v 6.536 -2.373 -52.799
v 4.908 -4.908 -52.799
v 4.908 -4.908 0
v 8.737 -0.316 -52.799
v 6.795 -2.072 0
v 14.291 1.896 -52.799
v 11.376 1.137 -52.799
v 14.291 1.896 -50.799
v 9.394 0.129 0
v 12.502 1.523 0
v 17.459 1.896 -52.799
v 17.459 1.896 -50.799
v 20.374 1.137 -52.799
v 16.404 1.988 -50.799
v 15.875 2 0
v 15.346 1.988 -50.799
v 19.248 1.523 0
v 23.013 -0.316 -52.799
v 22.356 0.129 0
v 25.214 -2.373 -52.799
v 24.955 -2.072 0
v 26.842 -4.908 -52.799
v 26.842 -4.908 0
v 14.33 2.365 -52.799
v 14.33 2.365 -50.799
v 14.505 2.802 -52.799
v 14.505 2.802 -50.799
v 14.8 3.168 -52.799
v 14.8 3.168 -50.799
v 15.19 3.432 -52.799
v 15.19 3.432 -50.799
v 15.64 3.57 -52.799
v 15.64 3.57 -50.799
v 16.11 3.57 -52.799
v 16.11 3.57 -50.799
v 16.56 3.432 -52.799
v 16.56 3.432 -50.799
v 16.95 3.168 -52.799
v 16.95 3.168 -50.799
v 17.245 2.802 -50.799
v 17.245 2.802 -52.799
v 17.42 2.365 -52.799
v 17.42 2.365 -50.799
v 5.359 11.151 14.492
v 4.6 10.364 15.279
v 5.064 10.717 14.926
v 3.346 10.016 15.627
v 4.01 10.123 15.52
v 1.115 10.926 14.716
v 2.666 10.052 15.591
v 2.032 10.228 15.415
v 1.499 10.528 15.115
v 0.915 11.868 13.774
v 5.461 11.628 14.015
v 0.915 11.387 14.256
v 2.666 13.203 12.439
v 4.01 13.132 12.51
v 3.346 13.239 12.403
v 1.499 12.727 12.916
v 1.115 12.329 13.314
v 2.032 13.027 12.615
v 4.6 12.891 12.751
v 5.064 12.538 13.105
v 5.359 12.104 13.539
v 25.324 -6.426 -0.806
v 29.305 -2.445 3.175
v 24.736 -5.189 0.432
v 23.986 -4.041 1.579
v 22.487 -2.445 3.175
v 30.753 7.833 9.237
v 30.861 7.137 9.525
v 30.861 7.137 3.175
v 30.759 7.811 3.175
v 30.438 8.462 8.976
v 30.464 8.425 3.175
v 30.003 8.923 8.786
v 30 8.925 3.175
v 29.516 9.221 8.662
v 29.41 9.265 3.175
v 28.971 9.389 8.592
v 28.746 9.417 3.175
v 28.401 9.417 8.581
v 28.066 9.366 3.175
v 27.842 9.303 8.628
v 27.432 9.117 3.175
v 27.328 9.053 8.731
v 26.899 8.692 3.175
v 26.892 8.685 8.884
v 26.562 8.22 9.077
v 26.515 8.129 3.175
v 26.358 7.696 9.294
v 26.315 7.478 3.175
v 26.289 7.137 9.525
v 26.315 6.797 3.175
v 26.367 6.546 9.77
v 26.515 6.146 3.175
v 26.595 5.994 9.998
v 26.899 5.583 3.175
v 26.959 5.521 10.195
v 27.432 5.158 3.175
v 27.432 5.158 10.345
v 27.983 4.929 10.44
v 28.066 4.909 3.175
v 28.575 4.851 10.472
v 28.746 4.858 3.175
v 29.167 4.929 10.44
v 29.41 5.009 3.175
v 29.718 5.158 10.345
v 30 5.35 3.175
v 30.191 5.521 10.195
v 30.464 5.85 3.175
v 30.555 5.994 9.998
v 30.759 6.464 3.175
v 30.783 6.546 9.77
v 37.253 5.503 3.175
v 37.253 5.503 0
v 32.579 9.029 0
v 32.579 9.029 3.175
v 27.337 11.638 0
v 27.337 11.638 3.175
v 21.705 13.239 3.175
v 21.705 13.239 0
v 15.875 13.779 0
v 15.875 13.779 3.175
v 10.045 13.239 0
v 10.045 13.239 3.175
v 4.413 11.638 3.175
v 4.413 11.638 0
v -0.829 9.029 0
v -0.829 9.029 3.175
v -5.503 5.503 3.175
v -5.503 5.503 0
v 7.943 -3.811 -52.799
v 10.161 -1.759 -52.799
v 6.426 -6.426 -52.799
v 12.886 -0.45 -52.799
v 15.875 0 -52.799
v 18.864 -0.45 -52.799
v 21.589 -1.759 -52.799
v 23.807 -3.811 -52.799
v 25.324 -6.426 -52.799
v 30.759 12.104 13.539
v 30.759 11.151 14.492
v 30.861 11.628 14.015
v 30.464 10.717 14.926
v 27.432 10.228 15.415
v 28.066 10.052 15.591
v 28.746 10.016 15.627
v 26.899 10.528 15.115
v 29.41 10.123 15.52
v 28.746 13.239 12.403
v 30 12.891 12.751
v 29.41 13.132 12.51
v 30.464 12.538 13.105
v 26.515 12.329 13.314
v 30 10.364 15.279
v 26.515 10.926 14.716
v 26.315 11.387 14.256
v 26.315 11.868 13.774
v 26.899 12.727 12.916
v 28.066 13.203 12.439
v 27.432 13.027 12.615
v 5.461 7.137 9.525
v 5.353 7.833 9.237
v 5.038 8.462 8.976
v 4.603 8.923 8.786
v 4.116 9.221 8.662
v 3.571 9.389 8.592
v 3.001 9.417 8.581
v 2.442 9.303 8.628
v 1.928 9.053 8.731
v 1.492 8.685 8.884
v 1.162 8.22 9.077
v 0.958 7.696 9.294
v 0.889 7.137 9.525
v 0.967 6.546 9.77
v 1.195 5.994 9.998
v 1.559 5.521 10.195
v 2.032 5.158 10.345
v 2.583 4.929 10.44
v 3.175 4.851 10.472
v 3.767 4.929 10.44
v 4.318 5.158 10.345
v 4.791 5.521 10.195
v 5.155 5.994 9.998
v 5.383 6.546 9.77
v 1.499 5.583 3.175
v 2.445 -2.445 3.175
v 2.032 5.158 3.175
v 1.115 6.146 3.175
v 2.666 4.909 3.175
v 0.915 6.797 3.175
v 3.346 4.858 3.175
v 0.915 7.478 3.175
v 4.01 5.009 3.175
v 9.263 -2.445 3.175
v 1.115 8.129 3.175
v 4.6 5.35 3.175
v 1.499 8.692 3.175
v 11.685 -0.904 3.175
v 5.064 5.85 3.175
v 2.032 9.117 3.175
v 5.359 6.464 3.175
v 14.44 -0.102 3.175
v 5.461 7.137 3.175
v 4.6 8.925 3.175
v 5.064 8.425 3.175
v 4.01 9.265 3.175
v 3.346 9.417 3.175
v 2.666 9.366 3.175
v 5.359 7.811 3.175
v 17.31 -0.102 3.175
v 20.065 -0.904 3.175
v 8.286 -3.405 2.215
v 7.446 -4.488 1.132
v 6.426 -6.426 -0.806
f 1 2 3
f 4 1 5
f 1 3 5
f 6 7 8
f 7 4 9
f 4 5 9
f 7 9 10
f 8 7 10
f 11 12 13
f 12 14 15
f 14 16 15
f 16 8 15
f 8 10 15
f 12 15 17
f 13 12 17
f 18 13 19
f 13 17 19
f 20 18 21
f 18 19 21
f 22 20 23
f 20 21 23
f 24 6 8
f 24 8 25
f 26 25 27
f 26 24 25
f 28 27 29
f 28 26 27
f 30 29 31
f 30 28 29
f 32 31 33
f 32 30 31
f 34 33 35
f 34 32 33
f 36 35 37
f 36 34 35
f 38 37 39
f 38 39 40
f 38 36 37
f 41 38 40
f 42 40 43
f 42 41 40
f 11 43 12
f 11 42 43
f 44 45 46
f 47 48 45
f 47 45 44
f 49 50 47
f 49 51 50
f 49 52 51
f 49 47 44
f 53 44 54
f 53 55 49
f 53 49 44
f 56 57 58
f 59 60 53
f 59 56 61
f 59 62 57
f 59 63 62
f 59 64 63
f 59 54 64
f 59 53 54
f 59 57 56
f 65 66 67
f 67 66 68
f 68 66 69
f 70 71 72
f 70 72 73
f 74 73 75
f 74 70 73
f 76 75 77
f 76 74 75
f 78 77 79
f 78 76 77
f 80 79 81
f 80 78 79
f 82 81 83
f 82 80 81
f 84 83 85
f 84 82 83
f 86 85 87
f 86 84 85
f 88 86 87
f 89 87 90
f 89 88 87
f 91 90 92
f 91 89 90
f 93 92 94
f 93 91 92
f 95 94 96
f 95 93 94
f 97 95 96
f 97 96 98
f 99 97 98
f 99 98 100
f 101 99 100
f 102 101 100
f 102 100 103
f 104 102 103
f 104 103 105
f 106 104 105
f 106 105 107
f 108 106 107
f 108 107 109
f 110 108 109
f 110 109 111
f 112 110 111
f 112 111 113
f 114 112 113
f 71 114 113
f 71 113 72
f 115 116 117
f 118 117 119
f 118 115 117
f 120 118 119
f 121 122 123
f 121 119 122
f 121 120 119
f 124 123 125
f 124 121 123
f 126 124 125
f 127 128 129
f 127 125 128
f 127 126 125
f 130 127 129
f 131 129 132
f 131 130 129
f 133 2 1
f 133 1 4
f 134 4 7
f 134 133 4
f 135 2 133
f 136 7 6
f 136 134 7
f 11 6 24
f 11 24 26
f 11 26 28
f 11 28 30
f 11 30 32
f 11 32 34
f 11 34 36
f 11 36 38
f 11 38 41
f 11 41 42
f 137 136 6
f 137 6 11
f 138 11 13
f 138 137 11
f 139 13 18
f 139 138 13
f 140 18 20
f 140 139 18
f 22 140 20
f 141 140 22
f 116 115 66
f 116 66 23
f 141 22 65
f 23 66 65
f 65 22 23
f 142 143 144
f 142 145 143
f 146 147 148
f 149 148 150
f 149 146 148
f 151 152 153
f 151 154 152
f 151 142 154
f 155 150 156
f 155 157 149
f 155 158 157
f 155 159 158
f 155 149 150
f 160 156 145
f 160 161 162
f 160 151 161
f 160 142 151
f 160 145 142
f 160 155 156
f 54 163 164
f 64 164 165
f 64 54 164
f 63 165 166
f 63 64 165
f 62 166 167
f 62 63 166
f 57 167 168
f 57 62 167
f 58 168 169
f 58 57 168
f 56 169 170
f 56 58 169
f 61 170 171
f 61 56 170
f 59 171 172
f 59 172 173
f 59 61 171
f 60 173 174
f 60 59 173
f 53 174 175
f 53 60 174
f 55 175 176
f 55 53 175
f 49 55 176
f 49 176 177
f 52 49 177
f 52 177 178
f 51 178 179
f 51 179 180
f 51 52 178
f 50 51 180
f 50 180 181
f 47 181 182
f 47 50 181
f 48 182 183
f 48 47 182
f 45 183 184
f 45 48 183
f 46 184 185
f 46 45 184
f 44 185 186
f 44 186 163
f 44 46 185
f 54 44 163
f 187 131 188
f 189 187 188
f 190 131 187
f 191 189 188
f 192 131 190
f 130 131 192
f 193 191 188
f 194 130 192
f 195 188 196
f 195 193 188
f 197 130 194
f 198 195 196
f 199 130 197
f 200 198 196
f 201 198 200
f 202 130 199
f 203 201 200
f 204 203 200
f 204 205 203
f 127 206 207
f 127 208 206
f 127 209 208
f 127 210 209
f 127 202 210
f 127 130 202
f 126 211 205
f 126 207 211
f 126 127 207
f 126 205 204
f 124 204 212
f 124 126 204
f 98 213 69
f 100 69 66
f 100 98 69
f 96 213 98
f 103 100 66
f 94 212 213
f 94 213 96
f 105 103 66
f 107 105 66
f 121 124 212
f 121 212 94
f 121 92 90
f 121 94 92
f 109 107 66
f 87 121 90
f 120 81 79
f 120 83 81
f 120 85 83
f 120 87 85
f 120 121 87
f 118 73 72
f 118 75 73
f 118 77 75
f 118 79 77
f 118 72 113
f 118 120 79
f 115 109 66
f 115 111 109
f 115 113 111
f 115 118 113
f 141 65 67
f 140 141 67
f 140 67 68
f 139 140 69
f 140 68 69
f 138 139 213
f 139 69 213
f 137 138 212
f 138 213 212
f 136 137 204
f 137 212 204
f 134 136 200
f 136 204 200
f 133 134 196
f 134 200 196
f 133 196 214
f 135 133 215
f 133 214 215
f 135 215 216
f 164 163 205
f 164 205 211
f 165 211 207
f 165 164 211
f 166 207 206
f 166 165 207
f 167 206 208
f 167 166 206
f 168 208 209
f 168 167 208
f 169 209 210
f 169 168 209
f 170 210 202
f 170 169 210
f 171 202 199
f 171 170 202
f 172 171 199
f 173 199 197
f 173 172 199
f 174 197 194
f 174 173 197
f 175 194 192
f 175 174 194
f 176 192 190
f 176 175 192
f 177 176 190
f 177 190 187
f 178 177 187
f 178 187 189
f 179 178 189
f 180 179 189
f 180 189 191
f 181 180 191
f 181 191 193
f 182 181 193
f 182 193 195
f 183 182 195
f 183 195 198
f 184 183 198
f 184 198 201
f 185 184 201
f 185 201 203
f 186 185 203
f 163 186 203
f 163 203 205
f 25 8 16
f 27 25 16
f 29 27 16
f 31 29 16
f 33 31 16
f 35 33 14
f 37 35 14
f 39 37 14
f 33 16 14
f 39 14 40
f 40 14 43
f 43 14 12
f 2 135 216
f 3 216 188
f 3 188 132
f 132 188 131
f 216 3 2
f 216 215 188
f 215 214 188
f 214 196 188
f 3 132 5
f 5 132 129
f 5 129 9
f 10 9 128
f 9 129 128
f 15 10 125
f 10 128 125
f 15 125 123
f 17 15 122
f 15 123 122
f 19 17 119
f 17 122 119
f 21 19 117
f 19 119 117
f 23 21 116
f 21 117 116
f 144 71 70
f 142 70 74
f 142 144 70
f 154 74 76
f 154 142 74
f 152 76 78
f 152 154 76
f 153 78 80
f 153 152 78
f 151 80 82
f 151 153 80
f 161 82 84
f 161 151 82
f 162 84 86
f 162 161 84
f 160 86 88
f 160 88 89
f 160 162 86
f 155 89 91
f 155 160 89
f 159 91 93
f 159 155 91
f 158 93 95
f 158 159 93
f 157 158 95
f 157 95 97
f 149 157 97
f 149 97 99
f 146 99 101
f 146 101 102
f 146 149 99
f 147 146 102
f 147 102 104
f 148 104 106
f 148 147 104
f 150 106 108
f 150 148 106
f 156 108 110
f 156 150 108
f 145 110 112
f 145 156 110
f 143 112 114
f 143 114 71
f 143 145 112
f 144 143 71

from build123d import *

# Parameters (mm, degrees)
F0_W      = 31.75
F0_H      = 9.525
F1_DEPTH  = 3.175
F4_R      = 2.286
F8_R      = 2.286
F11_DEPTH = 3.175
F13_DEPTH = 52.79898
F15_DEPTH = 25.4
F17_DEPTH = 2


with BuildPart() as f1:
    # F0 (on Top) → F1 (new body)
    with BuildSketch(Plane.XY):
        with Locations((15.875, 4.7625)):
            Rectangle(F0_W, F0_H)
    extrude(amount=F1_DEPTH)

    # F5: sweep along a path in F3
    with BuildLine(Plane.YZ.offset(28.575)) as f5_path:
        Line((7.1374, 3.175), (7.1374, 9.525))
        Line((7.1374, 9.525), (11.6275280605, 14.0151280605))
    # F4 (on face) → F5 (sweep)
    with BuildSketch(Plane.XY.offset(3.175)):
        with Locations((28.575, 7.1374)):
            Circle(F4_R)
    sweep(path=f5_path.line, transition=Transition.RIGHT)

    # F9: sweep along a path in F7
    with BuildLine(Plane.YZ.offset(3.175)) as f9_path:
        Line((7.1374, 3.175), (7.1374, 9.525))
        Line((7.1374, 9.525), (11.6275280605, 14.0151280605))
    # F8 (on face) → F9 (sweep)
    with BuildSketch(Plane.XY.offset(3.175)):
        with Locations((3.175, 7.1374)):
            Circle(F8_R)
    sweep(path=f9_path.line, transition=Transition.RIGHT)

    # F10 (on face) → F11 (join, through all)
    with BuildSketch(Plane.XY.offset(3.175)):
        with BuildLine():
            Line((25.3239712887, -6.4260287113), (37.2530060984, 5.5030060984))
            ThreePointArc((37.2530060984, 5.5030060984), (15.875, 13.7786934298), (-5.5030060984, 5.5030060984))
            Line((-5.5030060984, 5.5030060984), (6.4260287113, -6.4260287113))
            ThreePointArc((6.4260287113, -6.4260287113), (15.875, 0), (25.3239712887, -6.4260287113))
        make_face()
    extrude(amount=-F11_DEPTH)

    # F12 (on face) → F13 (join)
    with BuildSketch(Plane(origin=(0, 0, 0), x_dir=(1, 0, 0), z_dir=(0, 0, -1))):
        with BuildLine():
            Line((6.4260287113, 6.4260287113), (4.9077839908, 4.9077839908))
            ThreePointArc((4.9077839908, 4.9077839908), (15.875, -2), (26.8422160092, 4.9077839908))
            Line((26.8422160092, 4.9077839908), (25.3239712887, 6.4260287113))
            ThreePointArc((25.3239712887, 6.4260287113), (15.875, 0), (6.4260287113, 6.4260287113))
        make_face()
    extrude(amount=F13_DEPTH)

    # F14 (on face) → F15 (cut)
    with BuildSketch(Plane(origin=(0, 12.8213280605, 12.8213280605), x_dir=(1, 0, 0), z_dir=(0, 0.7071067812, 0.7071067812))):
        Polygon((3.175, -3.9742881508), (2.4454922036, -3.9742881508), (2.4454922036, -10.2548293379), (29.3045077964, -10.2548293379), (29.3045077964, -3.9742881508), align=None)
    extrude(amount=-F15_DEPTH, mode=Mode.SUBTRACT)

    # F16 (on face) → F17 (join)
    with BuildSketch(Plane(origin=(0, 0, -52.79898), x_dir=(1, 0, 0), z_dir=(0, 0, -1))):
        with BuildLine():
            ThreePointArc((17.4591143082, -1.8963751542), (15.875, -2), (14.2908856918, -1.8963751542))
            ThreePointArc((14.2908856918, -1.8963751542), (15.875, -3.5875), (17.4591143082, -1.8963751542))
        make_face()
    extrude(amount=-F17_DEPTH)


solid = f1.part
